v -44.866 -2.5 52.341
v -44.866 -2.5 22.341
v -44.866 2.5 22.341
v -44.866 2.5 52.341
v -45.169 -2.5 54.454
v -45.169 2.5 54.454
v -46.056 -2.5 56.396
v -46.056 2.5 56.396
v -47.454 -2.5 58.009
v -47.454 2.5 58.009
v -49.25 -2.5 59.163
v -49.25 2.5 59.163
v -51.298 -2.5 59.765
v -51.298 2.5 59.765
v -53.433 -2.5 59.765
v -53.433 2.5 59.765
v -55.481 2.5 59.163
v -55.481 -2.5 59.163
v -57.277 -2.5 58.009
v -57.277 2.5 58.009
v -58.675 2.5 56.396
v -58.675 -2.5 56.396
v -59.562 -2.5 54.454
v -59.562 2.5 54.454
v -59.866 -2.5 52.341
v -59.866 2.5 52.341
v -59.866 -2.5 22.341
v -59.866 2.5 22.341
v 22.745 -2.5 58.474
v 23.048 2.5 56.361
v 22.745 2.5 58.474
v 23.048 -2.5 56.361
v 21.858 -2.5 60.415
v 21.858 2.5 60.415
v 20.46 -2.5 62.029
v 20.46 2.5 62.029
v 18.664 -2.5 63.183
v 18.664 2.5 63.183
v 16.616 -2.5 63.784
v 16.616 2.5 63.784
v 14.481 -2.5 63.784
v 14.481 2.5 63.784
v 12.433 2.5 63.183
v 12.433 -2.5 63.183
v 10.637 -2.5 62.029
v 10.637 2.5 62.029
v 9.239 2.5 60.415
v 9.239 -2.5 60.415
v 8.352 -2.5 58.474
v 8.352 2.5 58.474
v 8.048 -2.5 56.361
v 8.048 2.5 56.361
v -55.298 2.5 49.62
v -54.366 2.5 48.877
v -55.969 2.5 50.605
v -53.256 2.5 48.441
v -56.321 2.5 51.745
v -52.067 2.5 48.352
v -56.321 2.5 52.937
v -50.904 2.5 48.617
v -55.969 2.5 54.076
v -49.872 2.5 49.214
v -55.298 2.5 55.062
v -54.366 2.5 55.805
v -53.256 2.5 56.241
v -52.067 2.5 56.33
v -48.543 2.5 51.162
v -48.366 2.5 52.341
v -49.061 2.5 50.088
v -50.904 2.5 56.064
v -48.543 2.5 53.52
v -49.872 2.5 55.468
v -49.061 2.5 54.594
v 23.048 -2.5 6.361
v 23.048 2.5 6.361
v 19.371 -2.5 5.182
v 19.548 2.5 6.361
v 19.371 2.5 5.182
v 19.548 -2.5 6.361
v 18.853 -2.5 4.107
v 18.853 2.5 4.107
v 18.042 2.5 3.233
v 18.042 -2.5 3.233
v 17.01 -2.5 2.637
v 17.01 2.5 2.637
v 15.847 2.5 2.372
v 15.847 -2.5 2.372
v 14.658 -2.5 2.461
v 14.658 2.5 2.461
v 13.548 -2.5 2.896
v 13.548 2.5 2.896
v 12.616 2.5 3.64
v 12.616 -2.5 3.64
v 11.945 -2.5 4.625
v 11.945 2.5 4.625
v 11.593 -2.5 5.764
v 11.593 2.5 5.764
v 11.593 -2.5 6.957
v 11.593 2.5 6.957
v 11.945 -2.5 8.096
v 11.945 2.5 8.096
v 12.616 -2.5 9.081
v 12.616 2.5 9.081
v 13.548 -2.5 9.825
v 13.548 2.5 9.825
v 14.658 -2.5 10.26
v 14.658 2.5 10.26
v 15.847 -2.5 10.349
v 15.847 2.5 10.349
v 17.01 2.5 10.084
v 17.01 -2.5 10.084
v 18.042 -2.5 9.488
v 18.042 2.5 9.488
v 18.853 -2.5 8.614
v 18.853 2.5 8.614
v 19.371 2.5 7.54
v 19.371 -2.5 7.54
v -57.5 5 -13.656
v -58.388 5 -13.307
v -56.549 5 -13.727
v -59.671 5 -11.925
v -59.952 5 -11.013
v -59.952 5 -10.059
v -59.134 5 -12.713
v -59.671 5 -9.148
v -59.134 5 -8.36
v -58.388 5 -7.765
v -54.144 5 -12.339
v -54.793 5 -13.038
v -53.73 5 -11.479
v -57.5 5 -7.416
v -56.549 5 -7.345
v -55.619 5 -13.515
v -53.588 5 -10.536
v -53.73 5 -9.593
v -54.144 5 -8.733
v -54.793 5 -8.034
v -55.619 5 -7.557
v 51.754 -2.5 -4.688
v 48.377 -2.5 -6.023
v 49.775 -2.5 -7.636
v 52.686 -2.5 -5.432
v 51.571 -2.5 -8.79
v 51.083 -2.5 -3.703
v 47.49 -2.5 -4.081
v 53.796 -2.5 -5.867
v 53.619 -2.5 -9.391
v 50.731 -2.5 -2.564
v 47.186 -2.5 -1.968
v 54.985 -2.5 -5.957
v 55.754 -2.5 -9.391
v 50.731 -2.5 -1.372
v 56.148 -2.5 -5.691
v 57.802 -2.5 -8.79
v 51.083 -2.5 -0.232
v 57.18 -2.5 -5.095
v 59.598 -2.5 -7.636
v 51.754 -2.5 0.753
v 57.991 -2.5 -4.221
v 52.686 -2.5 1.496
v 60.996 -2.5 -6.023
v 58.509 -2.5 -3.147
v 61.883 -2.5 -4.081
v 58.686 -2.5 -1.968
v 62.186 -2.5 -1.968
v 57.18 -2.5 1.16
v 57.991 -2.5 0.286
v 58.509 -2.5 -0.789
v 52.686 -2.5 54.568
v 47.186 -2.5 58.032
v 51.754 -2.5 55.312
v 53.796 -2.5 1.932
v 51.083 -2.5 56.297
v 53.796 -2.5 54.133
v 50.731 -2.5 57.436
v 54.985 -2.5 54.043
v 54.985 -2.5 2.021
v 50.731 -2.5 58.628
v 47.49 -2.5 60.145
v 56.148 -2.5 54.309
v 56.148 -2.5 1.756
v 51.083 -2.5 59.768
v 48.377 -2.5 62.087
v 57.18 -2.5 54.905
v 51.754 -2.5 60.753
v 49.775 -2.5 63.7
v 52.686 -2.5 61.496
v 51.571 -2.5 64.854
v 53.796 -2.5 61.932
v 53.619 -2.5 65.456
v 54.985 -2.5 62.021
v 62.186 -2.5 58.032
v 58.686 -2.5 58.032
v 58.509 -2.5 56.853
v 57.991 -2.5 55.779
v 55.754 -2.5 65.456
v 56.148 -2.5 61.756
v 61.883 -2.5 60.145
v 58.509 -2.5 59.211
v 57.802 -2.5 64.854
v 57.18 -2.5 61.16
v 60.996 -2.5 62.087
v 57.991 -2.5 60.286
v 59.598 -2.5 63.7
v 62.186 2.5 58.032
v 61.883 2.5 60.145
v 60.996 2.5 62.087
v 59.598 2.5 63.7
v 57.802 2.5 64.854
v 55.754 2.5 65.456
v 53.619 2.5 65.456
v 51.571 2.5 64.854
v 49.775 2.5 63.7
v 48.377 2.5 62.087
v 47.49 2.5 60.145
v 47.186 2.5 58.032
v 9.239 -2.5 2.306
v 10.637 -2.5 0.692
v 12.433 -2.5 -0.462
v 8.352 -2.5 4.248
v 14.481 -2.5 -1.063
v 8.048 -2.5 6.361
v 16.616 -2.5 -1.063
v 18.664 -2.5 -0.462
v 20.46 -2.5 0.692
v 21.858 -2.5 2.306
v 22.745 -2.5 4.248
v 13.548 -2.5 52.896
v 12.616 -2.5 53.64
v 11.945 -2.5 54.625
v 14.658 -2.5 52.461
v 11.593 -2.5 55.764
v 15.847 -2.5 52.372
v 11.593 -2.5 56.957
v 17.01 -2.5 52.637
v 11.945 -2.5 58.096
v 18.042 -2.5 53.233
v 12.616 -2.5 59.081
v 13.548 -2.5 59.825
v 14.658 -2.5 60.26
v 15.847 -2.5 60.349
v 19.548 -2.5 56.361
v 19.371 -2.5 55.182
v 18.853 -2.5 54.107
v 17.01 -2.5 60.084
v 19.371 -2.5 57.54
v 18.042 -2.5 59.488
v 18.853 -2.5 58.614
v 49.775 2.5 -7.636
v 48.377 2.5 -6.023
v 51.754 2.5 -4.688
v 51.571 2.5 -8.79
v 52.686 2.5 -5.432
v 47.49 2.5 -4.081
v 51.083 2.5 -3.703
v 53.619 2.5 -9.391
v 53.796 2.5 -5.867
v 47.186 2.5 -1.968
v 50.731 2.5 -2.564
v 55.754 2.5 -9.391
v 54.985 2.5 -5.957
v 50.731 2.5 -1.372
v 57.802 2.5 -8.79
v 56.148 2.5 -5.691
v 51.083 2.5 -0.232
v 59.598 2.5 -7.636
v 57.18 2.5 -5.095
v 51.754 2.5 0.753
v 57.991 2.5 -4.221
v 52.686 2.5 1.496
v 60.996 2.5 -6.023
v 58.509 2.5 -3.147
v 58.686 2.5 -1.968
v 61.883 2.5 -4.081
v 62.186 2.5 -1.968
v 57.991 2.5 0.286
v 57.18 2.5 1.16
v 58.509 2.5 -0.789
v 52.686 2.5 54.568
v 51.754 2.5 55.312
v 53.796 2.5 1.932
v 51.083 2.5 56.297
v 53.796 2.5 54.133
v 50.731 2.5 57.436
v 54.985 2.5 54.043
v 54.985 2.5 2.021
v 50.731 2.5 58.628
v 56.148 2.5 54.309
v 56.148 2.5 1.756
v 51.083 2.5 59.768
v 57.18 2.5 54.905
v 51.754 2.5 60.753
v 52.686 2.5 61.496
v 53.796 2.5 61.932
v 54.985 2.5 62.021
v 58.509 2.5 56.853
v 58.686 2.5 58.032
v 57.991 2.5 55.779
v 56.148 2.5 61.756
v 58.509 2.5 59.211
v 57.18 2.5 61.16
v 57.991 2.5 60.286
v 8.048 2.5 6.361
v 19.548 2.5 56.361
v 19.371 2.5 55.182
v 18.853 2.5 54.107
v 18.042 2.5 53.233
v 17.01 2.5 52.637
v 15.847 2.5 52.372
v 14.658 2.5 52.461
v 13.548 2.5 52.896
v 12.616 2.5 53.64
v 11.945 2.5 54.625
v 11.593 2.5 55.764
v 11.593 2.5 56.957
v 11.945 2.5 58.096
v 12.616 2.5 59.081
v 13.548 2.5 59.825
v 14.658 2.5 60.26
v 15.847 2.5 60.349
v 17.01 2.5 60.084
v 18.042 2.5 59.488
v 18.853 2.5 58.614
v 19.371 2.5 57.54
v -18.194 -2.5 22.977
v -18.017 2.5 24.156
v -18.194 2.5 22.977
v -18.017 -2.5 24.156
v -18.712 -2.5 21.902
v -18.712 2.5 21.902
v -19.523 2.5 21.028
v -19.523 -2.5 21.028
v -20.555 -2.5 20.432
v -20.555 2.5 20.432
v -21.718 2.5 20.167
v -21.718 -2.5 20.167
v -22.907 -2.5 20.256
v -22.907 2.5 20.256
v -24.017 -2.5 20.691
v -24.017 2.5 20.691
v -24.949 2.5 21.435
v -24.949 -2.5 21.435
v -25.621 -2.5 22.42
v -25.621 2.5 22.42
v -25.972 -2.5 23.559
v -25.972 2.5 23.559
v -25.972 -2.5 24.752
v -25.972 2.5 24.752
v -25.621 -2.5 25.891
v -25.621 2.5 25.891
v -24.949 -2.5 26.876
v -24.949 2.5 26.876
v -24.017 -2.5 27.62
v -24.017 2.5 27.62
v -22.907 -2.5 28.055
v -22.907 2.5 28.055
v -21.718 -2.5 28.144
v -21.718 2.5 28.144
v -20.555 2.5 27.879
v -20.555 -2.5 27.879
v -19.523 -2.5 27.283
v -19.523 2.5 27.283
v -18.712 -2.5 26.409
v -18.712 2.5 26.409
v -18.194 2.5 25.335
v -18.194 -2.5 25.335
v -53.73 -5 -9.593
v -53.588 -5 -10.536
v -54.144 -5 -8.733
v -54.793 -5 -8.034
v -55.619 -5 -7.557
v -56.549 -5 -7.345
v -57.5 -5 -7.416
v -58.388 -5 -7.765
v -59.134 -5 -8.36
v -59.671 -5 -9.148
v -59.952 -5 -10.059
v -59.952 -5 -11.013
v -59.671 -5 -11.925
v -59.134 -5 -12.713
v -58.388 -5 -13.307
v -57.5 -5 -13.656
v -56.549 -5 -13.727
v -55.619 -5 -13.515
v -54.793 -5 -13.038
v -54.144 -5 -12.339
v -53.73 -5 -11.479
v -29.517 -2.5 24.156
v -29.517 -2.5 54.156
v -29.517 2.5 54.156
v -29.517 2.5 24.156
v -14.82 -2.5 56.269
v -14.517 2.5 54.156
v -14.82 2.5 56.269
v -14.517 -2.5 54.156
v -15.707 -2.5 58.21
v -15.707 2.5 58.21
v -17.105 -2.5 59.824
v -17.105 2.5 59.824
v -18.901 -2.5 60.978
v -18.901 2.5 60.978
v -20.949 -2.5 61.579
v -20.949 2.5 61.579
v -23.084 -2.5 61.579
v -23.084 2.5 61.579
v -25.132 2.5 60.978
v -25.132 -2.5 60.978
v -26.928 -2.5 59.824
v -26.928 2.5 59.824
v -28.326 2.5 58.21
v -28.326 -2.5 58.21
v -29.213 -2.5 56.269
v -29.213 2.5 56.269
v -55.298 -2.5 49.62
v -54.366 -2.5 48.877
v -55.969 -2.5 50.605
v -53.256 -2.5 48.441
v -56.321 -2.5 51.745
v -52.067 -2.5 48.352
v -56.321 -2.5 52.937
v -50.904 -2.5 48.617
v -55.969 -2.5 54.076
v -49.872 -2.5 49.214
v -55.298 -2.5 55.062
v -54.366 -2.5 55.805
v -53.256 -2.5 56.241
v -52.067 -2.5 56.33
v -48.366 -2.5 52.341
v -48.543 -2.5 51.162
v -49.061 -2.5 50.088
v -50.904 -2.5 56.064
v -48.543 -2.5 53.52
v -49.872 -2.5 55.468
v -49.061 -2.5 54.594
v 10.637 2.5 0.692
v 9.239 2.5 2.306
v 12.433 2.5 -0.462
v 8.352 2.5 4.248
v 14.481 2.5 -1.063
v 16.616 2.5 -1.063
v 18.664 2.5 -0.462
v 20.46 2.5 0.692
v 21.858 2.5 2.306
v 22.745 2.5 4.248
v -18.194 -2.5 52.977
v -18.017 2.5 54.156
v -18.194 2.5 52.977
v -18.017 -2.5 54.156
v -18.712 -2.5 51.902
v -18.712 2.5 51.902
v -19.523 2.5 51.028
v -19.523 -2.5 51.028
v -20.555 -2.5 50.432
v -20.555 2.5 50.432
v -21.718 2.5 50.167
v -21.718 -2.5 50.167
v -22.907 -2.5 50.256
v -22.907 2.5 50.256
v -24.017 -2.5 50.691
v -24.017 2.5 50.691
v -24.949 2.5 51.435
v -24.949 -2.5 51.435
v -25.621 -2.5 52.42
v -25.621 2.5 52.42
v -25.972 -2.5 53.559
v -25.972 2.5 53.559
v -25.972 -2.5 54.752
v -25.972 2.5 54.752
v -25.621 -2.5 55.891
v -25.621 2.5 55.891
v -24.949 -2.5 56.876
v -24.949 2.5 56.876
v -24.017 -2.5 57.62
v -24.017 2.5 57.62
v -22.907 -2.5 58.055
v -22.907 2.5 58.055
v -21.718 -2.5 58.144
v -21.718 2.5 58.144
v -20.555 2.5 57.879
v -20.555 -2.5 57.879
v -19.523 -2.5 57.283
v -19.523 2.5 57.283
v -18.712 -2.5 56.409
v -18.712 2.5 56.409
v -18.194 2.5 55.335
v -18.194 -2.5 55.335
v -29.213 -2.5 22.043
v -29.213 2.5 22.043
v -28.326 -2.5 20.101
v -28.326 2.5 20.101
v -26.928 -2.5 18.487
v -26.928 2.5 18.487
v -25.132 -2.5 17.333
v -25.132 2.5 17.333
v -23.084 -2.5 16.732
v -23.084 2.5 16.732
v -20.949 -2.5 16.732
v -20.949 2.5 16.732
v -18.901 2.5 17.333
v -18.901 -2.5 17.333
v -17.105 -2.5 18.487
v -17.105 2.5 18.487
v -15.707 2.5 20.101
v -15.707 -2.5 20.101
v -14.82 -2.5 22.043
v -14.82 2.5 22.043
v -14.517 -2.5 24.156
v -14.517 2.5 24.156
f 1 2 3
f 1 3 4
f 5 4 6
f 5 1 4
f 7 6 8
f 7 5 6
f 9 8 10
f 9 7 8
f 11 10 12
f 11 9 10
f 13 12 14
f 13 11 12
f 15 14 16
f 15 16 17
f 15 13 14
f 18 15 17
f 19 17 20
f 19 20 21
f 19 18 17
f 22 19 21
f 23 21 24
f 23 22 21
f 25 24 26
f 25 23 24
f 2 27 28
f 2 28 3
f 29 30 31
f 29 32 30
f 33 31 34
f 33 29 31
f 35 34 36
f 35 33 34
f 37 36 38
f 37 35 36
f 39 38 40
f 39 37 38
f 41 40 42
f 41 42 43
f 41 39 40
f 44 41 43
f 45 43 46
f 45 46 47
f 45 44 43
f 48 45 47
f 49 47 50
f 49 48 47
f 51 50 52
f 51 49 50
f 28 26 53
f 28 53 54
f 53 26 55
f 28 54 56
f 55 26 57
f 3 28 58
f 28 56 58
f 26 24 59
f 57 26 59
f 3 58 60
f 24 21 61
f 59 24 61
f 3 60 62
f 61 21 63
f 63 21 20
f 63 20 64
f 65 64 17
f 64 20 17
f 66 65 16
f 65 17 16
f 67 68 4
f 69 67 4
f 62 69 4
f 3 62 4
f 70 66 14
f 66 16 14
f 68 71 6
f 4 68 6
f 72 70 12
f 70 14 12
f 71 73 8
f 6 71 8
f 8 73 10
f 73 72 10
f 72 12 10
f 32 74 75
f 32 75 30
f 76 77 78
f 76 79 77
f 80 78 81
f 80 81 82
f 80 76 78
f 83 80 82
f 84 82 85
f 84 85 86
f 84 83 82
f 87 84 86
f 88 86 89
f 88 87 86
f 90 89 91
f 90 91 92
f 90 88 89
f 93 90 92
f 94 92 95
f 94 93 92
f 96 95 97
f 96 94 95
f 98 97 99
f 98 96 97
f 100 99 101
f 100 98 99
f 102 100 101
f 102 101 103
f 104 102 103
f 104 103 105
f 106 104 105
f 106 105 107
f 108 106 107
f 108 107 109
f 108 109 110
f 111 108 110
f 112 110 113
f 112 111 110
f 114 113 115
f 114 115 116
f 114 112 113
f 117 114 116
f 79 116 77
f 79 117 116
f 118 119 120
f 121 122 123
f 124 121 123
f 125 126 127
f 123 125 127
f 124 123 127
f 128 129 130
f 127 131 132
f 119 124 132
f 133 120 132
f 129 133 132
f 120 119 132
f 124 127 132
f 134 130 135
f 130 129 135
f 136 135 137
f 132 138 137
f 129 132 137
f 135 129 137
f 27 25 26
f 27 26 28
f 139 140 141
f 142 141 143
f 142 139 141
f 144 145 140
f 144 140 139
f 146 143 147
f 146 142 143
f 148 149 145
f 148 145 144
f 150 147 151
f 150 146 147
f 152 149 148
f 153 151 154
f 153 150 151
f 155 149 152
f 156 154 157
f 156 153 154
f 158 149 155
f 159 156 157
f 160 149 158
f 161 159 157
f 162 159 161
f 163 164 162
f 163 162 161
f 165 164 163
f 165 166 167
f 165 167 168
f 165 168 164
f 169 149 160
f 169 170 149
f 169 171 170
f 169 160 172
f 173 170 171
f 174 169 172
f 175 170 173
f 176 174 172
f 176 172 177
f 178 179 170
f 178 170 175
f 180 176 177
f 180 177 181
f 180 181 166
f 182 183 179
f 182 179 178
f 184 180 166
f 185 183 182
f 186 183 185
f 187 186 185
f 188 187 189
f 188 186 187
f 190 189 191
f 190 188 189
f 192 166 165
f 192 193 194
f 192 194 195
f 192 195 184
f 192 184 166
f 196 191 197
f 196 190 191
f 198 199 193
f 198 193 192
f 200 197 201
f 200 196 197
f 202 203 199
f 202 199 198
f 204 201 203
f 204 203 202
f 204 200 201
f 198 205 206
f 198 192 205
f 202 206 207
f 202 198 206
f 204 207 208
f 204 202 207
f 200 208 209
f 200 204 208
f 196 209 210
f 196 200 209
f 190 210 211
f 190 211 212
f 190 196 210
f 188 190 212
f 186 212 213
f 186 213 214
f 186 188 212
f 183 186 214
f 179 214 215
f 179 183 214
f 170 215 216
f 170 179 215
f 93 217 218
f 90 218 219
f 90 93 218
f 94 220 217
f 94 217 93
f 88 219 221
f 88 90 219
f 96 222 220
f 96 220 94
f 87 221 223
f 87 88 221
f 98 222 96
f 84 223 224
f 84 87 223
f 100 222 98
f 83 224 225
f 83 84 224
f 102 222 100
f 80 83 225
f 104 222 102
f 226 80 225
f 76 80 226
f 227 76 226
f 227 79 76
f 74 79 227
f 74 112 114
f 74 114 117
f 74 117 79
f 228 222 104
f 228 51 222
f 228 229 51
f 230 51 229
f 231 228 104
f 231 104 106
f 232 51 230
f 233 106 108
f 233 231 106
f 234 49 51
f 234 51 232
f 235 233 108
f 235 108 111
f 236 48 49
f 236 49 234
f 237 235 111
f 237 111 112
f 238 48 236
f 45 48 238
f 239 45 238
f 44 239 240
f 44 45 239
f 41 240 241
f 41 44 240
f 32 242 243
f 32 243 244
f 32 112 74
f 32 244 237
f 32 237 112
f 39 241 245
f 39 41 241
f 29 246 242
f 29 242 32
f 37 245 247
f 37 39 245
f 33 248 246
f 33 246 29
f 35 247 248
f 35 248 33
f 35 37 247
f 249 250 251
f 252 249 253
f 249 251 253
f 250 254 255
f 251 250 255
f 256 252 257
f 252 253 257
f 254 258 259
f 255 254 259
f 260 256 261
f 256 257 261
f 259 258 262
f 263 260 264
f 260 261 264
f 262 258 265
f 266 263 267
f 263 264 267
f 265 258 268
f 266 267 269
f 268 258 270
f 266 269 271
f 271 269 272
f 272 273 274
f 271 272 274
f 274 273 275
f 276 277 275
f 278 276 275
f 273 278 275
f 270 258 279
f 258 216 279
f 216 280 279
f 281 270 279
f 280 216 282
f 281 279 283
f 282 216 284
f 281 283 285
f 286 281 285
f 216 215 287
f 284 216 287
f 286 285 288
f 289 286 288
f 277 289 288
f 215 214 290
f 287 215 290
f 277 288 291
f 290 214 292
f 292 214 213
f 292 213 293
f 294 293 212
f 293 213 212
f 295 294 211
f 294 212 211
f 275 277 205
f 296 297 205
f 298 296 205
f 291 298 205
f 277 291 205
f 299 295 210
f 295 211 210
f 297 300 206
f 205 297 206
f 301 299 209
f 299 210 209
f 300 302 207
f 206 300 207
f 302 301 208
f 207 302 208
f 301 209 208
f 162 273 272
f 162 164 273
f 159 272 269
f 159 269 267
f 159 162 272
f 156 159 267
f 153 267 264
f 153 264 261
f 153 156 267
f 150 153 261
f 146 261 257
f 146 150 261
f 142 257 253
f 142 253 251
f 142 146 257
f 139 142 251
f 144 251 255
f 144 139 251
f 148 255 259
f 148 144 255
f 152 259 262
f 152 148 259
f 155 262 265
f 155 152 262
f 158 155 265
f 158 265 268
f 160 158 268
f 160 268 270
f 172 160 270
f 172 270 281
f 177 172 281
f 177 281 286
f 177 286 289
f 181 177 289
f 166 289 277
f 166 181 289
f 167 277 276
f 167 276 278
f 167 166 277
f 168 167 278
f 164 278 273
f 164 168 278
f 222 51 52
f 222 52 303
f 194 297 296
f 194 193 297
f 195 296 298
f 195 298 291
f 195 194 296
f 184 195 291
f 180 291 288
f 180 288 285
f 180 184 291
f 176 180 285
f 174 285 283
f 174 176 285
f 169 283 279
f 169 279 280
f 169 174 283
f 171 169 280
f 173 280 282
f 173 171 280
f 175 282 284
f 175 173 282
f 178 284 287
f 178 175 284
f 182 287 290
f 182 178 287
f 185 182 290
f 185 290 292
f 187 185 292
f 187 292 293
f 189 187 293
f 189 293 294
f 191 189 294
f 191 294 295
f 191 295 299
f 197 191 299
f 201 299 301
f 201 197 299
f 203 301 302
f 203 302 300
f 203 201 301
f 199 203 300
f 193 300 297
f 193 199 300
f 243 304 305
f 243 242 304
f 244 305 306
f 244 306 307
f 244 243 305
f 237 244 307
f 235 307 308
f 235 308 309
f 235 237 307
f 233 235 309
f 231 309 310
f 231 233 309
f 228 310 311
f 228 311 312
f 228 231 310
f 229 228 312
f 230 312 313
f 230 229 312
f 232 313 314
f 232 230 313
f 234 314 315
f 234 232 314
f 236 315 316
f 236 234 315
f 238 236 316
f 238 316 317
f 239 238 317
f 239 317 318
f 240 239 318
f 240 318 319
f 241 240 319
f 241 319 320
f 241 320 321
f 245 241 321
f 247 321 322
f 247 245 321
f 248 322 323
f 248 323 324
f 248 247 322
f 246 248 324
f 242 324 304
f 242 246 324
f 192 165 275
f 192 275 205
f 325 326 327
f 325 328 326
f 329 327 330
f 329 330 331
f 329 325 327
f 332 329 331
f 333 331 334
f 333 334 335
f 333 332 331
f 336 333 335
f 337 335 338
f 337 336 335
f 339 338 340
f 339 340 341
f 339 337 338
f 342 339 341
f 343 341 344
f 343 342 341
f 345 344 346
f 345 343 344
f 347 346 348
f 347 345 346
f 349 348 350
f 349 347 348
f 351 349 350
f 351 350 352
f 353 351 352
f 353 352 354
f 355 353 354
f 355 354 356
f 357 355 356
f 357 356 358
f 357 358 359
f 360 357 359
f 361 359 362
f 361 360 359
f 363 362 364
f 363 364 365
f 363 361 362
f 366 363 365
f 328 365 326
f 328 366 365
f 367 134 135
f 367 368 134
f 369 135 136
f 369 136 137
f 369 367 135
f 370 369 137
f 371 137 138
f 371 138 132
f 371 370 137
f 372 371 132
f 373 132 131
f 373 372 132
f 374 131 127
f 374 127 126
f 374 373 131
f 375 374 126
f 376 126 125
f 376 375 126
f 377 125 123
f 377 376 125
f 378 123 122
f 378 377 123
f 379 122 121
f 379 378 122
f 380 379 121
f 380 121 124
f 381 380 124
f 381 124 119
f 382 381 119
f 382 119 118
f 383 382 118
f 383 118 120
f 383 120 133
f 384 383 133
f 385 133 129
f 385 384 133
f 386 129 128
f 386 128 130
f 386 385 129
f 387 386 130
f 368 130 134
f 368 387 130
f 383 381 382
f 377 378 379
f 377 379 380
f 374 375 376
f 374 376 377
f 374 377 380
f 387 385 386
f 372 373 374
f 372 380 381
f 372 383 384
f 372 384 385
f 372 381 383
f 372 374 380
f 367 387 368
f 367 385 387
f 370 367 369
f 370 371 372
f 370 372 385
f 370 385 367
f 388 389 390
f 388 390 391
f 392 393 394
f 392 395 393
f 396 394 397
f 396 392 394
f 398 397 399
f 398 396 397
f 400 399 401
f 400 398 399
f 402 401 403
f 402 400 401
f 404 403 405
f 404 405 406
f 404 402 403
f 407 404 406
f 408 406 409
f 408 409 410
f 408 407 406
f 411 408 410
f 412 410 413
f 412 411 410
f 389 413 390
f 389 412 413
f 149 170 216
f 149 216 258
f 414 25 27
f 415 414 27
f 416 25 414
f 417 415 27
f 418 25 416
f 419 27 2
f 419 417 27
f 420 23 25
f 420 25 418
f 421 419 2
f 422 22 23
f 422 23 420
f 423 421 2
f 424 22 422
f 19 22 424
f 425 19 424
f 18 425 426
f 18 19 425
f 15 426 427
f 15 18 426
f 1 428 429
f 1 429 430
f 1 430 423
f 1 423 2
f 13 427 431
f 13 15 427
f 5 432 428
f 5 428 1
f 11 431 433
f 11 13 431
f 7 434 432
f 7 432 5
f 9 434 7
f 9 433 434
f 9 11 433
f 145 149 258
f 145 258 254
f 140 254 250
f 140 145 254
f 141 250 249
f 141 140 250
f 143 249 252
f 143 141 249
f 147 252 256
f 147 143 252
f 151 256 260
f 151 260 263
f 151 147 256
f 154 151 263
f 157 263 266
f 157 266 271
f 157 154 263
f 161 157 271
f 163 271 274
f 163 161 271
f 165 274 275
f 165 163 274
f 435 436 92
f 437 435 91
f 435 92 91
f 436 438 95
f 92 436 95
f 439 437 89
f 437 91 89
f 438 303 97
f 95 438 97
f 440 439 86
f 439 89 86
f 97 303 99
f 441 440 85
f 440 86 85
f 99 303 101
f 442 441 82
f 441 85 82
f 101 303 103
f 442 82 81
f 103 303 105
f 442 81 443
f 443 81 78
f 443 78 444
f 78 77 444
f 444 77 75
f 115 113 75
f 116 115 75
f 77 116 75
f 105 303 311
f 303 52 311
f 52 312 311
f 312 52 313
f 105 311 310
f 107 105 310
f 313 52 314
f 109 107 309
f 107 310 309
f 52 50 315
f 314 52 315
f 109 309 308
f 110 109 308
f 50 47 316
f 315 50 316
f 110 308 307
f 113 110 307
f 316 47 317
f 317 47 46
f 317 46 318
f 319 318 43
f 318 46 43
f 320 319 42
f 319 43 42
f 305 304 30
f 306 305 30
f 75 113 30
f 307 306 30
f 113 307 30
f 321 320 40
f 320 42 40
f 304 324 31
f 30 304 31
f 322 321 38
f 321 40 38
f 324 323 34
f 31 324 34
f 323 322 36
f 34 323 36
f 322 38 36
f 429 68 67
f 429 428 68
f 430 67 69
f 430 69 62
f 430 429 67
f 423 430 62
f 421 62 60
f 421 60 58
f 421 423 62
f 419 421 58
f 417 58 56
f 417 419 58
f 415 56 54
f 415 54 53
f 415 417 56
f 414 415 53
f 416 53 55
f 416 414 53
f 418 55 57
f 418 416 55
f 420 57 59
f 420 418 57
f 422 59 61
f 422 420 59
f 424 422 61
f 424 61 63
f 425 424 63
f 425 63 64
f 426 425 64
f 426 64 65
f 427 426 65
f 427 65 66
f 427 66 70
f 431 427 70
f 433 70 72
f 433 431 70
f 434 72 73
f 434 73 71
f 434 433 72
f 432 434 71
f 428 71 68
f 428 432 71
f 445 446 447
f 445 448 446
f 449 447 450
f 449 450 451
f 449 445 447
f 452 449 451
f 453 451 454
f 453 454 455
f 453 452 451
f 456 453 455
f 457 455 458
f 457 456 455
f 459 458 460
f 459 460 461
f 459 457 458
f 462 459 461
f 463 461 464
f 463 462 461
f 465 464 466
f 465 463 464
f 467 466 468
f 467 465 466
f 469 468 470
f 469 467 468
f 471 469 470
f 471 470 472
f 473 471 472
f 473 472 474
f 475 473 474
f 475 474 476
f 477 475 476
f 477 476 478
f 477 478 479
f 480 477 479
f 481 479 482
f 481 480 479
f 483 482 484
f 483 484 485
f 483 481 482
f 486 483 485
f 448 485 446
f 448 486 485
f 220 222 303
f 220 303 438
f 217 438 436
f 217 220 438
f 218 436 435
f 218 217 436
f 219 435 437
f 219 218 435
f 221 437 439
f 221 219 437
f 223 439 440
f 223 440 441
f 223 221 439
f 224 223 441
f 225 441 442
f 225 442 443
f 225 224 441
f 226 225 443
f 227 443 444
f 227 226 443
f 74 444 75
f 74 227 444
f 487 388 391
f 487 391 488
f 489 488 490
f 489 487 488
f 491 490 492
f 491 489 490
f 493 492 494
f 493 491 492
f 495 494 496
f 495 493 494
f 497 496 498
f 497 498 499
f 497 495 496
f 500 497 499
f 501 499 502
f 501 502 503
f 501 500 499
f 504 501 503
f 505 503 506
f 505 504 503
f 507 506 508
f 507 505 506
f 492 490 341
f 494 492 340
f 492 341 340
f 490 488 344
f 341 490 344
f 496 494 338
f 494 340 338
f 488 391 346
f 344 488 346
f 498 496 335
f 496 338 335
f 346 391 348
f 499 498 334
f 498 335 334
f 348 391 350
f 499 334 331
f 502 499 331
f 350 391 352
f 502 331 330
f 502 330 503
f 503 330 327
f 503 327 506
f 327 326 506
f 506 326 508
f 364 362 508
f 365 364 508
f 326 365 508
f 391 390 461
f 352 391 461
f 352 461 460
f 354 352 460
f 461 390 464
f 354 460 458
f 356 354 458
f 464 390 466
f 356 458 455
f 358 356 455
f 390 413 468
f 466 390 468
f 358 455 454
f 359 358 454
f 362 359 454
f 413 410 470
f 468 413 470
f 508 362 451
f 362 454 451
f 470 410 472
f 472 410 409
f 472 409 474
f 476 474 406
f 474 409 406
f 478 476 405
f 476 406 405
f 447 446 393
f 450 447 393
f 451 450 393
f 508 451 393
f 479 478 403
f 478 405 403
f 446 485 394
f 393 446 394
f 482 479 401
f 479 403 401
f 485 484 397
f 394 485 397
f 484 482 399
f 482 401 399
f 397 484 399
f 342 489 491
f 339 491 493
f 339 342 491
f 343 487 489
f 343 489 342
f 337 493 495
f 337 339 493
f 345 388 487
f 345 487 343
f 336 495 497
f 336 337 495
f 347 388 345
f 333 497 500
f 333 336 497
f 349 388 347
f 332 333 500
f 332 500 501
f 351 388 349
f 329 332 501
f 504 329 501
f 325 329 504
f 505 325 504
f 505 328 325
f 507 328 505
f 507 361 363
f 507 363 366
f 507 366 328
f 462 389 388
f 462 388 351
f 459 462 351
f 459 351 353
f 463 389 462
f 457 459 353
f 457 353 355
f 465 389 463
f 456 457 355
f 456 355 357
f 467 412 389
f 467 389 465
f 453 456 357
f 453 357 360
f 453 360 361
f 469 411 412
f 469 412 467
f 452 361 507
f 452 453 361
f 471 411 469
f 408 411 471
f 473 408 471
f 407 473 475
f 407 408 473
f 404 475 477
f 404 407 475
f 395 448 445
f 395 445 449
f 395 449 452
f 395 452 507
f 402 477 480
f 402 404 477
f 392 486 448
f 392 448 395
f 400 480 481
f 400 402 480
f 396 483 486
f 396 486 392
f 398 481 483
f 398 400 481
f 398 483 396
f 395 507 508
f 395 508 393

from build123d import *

# Parameters (mm, degrees)
F1_DEPTH = 2.5
F3_DEPTH = 2.5
F5_DEPTH = 2.5
F7_DEPTH = 2.5
F8_R     = 3.2
F9_DEPTH = 5


with BuildPart() as f1:
    # F0 (on Front) → F1 (new body, symmetric)
    with BuildSketch(Plane.XZ):
        with BuildLine():
            ThreePointArc((-56.3655619472, 52.3408753172), (-52.3655619472, 56.3408753172), (-48.3655619472, 52.3408753172))
            Line((-48.3655619472, 52.3408753172), (-44.8655619472, 52.3408753172))
            ThreePointArc((-44.8655619472, 52.3408753172), (-52.3655619472, 59.8408753172), (-59.8655619472, 52.3408753172))
            Line((-59.8655619472, 52.3408753172), (-56.3655619472, 52.3408753172))
        make_face()
        with BuildLine():
            Line((-44.8655619472, 52.3408753172), (-48.3655619472, 52.3408753172))
            ThreePointArc((-48.3655619472, 52.3408753172), (-52.3655619472, 48.3408753172), (-56.3655619472, 52.3408753172))
            Line((-56.3655619472, 52.3408753172), (-59.8655619472, 52.3408753172))
            Line((-59.8655619472, 52.3408753172), (-59.8655619472, 22.3408753172))
            Line((-59.8655619472, 22.3408753172), (-44.8655619472, 22.3408753172))
            Line((-44.8655619472, 22.3408753172), (-44.8655619472, 52.3408753172))
        make_face()
    extrude(amount=F1_DEPTH, both=True)


with BuildPart() as f3:
    # F2 (on Front) → F3 (new body, symmetric)
    with BuildSketch(Plane.XZ):
        with BuildLine():
            ThreePointArc((-26.0166939691, 54.1555335373), (-22.0166939691, 58.1555335373), (-18.0166939691, 54.1555335373))
            Line((-18.0166939691, 54.1555335373), (-14.5166939691, 54.1555335373))
            ThreePointArc((-14.5166939691, 54.1555335373), (-22.0166939691, 61.6555335373), (-29.5166939691, 54.1555335373))
            Line((-29.5166939691, 54.1555335373), (-26.0166939691, 54.1555335373))
        make_face()
        with BuildLine():
            Line((-14.5166939691, 54.1555335373), (-18.0166939691, 54.1555335373))
            ThreePointArc((-18.0166939691, 54.1555335373), (-22.0166939691, 50.1555335373), (-26.0166939691, 54.1555335373))
            Line((-26.0166939691, 54.1555335373), (-29.5166939691, 54.1555335373))
            Line((-29.5166939691, 54.1555335373), (-29.5166939691, 24.1555335373))
            Line((-29.5166939691, 24.1555335373), (-26.0166939691, 24.1555335373))
            ThreePointArc((-26.0166939691, 24.1555335373), (-22.0166939691, 28.1555335373), (-18.0166939691, 24.1555335373))
            Line((-18.0166939691, 24.1555335373), (-14.5166939691, 24.1555335373))
            Line((-14.5166939691, 24.1555335373), (-14.5166939691, 54.1555335373))
        make_face()
        with BuildLine():
            ThreePointArc((-29.5166939691, 24.1555335373), (-22.0166939691, 16.6555335373), (-14.5166939691, 24.1555335373))
            Line((-14.5166939691, 24.1555335373), (-18.0166939691, 24.1555335373))
            ThreePointArc((-18.0166939691, 24.1555335373), (-22.0166939691, 20.1555335373), (-26.0166939691, 24.1555335373))
            Line((-26.0166939691, 24.1555335373), (-29.5166939691, 24.1555335373))
        make_face()
    extrude(amount=F3_DEPTH, both=True)


with BuildPart() as f5:
    # F4 (on Front) → F5 (new body, symmetric)
    with BuildSketch(Plane.XZ):
        with BuildLine():
            ThreePointArc((11.548390547, 56.360590132), (15.548390547, 60.360590132), (19.548390547, 56.360590132))
            Line((19.548390547, 56.360590132), (23.048390547, 56.360590132))
            ThreePointArc((23.048390547, 56.360590132), (15.548390547, 63.860590132), (8.048390547, 56.360590132))
            Line((8.048390547, 56.360590132), (11.548390547, 56.360590132))
        make_face()
        with BuildLine():
            Line((23.048390547, 56.360590132), (19.548390547, 56.360590132))
            ThreePointArc((19.548390547, 56.360590132), (15.548390547, 52.360590132), (11.548390547, 56.360590132))
            Line((11.548390547, 56.360590132), (8.048390547, 56.360590132))
            Line((8.048390547, 56.360590132), (8.048390547, 6.360590132))
            Line((8.048390547, 6.360590132), (11.548390547, 6.360590132))
            ThreePointArc((11.548390547, 6.360590132), (15.548390547, 10.360590132), (19.548390547, 6.360590132))
            Line((19.548390547, 6.360590132), (23.048390547, 6.360590132))
            Line((23.048390547, 6.360590132), (23.048390547, 56.360590132))
        make_face()
        with BuildLine():
            ThreePointArc((8.048390547, 6.360590132), (15.548390547, -1.139409868), (23.048390547, 6.360590132))
            Line((23.048390547, 6.360590132), (19.548390547, 6.360590132))
            ThreePointArc((19.548390547, 6.360590132), (15.548390547, 2.360590132), (11.548390547, 6.360590132))
            Line((11.548390547, 6.360590132), (8.048390547, 6.360590132))
        make_face()
    extrude(amount=F5_DEPTH, both=True)


with BuildPart() as f7:
    # F6 (on Front) → F7 (new body, symmetric)
    with BuildSketch(Plane.XZ):
        with BuildLine():
            ThreePointArc((50.6864643693, 58.0322301321), (54.6864643693, 62.0322301321), (58.6864643693, 58.0322301321))
            Line((58.6864643693, 58.0322301321), (62.1864643693, 58.0322301321))
            ThreePointArc((62.1864643693, 58.0322301321), (54.6864643693, 65.5322301321), (47.1864643693, 58.0322301321))
            Line((47.1864643693, 58.0322301321), (50.6864643693, 58.0322301321))
        make_face()
        with BuildLine():
            Line((62.1864643693, 58.0322301321), (58.6864643693, 58.0322301321))
            ThreePointArc((58.6864643693, 58.0322301321), (54.6864643693, 54.0322301321), (50.6864643693, 58.0322301321))
            Line((50.6864643693, 58.0322301321), (47.1864643693, 58.0322301321))
            Line((47.1864643693, 58.0322301321), (47.1864643693, -1.9677698679))
            Line((47.1864643693, -1.9677698679), (50.6864643693, -1.9677698679))
            ThreePointArc((50.6864643693, -1.9677698679), (54.6864643693, 2.0322301321), (58.6864643693, -1.9677698679))
            Line((58.6864643693, -1.9677698679), (62.1864643693, -1.9677698679))
            Line((62.1864643693, -1.9677698679), (62.1864643693, 58.0322301321))
        make_face()
        with BuildLine():
            ThreePointArc((47.1864643693, -1.9677698679), (54.6864643693, -9.4677698679), (62.1864643693, -1.9677698679))
            Line((62.1864643693, -1.9677698679), (58.6864643693, -1.9677698679))
            ThreePointArc((58.6864643693, -1.9677698679), (54.6864643693, -5.9677698679), (50.6864643693, -1.9677698679))
            Line((50.6864643693, -1.9677698679), (47.1864643693, -1.9677698679))
        make_face()
    extrude(amount=F7_DEPTH, both=True)


with BuildPart() as f9:
    # F8 (on Front) → F9 (new body, symmetric)
    with BuildSketch(Plane.XZ):
        with Locations((-56.787956506, -10.5360774323)):
            Circle(F8_R)
    extrude(amount=F9_DEPTH, both=True)


solid = Compound([f1.part, f3.part, f5.part, f7.part, f9.part])
